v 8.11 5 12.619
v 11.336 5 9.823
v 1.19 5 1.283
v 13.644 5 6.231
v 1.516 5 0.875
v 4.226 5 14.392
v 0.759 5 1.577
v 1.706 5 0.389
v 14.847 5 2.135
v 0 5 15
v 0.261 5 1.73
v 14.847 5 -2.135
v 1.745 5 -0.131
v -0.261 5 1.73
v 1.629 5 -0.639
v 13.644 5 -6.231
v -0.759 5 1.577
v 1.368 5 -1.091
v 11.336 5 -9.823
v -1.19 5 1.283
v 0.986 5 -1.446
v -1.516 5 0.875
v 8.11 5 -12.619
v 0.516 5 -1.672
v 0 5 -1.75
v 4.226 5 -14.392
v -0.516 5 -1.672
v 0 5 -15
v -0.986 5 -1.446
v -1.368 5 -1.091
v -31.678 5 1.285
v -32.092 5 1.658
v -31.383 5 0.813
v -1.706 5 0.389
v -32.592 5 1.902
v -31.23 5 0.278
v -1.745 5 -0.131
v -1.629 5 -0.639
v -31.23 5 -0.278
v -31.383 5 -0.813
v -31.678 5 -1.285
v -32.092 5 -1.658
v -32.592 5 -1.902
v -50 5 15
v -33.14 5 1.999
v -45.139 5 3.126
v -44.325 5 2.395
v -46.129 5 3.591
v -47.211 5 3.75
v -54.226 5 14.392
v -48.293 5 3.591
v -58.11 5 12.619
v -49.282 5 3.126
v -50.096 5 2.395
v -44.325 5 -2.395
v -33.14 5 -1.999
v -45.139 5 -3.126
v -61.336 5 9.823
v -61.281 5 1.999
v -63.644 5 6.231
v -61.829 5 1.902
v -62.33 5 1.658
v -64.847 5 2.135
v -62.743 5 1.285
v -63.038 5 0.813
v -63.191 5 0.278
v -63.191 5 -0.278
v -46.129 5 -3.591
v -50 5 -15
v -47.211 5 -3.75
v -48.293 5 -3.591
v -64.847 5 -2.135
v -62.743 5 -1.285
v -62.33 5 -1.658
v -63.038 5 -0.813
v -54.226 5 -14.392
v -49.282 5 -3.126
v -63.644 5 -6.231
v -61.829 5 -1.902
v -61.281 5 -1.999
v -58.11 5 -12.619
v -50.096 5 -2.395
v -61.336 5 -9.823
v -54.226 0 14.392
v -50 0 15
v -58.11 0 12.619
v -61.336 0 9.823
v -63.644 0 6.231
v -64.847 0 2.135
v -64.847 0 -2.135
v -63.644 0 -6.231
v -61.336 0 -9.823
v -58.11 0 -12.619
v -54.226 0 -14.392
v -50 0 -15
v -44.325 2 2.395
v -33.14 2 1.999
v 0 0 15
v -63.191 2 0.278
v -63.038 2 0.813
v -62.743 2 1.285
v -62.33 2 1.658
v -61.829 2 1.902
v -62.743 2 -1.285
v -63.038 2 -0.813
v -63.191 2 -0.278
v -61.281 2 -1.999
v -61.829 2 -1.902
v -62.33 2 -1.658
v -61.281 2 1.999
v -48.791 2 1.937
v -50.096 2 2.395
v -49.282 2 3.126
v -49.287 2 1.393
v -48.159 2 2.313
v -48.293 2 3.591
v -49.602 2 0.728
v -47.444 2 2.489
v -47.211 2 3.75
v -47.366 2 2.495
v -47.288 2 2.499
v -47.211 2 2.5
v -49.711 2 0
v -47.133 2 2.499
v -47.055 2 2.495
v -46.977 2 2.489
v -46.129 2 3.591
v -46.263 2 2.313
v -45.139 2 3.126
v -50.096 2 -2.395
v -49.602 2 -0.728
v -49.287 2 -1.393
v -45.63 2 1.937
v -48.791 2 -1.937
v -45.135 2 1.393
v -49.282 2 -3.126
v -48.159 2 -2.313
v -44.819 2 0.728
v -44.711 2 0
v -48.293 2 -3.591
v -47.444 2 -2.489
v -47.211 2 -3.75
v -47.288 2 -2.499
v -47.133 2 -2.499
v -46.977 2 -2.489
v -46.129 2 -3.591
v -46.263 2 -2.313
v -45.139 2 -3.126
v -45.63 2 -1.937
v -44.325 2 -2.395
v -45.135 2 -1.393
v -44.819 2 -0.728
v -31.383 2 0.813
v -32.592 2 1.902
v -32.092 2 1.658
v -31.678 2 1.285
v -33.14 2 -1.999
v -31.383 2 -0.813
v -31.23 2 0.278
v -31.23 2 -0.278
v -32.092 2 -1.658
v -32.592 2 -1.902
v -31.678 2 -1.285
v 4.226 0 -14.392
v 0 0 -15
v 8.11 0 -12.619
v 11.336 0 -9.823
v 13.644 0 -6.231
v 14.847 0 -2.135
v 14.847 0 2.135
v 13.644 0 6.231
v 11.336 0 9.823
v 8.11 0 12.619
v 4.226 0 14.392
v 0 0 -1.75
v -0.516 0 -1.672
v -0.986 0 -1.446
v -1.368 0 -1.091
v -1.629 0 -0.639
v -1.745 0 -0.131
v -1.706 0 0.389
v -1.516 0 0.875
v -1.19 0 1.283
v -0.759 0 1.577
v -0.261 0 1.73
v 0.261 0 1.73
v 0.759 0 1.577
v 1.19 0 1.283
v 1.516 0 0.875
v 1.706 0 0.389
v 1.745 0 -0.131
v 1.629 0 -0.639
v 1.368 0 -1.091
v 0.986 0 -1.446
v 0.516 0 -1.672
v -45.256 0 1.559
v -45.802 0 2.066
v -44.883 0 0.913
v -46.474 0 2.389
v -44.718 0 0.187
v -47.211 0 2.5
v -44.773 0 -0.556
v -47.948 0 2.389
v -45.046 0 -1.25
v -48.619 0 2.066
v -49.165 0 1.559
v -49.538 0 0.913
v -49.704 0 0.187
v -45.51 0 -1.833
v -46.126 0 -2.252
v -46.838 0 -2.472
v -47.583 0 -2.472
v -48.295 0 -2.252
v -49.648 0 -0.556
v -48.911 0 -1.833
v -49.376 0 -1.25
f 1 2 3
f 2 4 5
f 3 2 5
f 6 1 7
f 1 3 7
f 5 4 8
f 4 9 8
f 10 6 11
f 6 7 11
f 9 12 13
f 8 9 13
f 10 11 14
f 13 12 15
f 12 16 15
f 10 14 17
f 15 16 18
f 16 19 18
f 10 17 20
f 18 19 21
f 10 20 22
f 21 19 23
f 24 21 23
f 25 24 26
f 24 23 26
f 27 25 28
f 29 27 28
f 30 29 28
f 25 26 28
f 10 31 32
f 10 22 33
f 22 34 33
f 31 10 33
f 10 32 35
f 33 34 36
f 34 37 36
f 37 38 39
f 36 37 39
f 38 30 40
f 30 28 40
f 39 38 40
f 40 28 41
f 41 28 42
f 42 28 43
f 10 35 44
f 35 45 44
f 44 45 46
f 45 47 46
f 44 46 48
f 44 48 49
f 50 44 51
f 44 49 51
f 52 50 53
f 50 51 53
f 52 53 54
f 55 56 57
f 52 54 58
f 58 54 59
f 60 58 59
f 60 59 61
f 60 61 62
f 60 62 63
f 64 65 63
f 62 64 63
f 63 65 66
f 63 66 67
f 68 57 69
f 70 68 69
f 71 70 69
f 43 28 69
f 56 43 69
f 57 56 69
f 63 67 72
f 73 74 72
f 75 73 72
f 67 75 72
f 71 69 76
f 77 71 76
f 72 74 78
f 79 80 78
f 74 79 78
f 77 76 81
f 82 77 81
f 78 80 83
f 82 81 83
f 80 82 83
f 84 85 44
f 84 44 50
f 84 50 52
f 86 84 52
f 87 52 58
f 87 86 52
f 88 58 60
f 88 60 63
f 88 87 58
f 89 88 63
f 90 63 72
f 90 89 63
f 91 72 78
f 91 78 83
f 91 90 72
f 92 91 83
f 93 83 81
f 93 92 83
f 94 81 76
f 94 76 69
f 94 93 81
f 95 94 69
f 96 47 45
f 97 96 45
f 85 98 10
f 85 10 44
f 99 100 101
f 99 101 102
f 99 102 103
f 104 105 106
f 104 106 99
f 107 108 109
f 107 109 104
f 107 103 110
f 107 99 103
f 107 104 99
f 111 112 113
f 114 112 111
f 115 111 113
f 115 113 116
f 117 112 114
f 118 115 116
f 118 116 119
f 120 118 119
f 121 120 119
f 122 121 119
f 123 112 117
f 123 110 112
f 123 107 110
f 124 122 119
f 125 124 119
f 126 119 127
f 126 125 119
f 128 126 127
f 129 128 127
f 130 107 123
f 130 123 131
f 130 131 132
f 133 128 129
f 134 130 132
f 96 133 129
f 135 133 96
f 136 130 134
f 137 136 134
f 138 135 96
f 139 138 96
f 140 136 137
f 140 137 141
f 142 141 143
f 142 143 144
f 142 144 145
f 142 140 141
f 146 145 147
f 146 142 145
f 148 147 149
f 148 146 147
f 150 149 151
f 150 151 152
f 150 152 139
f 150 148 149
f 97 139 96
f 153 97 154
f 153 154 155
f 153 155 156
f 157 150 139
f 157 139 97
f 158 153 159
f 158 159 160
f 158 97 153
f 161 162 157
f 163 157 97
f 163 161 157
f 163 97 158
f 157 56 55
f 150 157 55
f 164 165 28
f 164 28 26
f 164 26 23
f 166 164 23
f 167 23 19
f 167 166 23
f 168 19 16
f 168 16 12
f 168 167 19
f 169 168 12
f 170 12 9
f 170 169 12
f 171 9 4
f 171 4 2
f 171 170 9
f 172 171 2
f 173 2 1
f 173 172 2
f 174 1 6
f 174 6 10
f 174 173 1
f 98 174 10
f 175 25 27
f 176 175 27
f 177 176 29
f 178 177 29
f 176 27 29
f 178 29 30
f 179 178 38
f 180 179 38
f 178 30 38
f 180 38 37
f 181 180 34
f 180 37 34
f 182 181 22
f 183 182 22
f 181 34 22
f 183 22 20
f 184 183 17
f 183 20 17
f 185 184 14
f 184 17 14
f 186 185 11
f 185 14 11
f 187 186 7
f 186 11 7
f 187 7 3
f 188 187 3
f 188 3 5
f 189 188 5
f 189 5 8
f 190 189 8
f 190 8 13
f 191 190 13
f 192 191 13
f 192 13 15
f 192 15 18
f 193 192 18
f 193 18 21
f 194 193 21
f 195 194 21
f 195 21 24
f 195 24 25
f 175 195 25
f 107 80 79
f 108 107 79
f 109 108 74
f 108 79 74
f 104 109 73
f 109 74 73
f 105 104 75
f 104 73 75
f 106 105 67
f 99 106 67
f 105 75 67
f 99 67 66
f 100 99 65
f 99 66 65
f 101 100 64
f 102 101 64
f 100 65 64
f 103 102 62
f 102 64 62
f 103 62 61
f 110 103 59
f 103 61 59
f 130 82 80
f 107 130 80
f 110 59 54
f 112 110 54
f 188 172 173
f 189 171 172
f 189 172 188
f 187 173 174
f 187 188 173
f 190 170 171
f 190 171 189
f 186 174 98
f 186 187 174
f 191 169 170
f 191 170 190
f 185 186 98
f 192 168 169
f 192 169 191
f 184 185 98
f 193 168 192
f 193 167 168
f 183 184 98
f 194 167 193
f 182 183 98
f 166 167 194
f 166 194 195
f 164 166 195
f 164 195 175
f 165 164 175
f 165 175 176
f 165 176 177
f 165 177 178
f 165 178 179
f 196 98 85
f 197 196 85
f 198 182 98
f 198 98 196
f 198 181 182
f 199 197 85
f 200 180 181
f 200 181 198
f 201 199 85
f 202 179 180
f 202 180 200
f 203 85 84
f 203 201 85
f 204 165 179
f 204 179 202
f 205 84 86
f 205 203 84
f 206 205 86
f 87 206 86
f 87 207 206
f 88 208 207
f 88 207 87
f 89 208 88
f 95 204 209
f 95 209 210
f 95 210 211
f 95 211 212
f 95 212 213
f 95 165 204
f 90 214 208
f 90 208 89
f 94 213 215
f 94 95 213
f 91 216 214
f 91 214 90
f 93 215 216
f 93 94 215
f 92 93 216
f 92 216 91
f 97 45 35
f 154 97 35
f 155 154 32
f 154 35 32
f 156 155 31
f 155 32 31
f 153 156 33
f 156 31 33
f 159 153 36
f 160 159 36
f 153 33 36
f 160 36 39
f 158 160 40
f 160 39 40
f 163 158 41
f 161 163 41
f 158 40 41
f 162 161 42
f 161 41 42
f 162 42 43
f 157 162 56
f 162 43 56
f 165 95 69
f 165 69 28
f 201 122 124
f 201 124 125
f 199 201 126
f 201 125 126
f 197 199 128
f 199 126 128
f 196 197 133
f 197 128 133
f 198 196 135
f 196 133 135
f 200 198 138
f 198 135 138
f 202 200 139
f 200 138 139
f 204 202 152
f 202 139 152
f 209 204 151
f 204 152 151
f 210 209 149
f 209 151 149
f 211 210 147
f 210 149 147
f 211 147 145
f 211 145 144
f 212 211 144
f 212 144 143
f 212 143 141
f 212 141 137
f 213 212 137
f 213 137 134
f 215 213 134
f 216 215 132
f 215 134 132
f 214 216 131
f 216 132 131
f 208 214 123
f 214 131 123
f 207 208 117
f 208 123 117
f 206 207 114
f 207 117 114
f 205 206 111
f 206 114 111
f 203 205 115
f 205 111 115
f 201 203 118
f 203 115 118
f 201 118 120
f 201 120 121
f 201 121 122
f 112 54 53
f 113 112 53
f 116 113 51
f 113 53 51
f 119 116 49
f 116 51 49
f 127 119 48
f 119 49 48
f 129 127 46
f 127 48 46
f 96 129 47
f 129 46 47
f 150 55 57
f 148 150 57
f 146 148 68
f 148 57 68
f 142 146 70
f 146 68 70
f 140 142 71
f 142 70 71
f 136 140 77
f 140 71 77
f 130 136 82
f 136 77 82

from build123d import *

# Parameters (mm, degrees)
RESSALTO_EXTRUS_O2_DEPTH = 5
ESBO_O4_R                = 1.75
CORTE_EXTRUS_O1_DEPTH    = 10
CORTE_EXTRUS_O2_DEPTH    = 3
ESBO_O7_R                = 2.5
CORTE_EXTRUS_O3_DEPTH    = 67.895440801


with BuildPart() as part:
    # Esboço3 → Ressalto-extrusão2 (new body)
    with BuildSketch(Plane(origin=(0, 0, 0), x_dir=(1, 0, 0), z_dir=(0, 1, 0))):
        with BuildLine():
            Line((-50, 15), (0, 15))
            ThreePointArc((0, 15), (15, 0), (0, -15))
            Line((0, -15), (-50, -15))
            ThreePointArc((-50, -15), (-65, 0), (-50, 15))
        make_face()
    extrude(amount=RESSALTO_EXTRUS_O2_DEPTH)

    # Esboço4 → Corte-extrusão1 (cut)
    with BuildSketch(Plane(origin=(0, 5, 0), x_dir=(1, 0, 0), z_dir=(0, 1, 0))):
        with Locations(Location((0, 0, 0), (0, 0, 90))):
            Circle(ESBO_O4_R)
    extrude(amount=-CORTE_EXTRUS_O1_DEPTH, mode=Mode.SUBTRACT)

    # Esboço6 → Corte-extrusão2 (cut)
    with BuildSketch(Plane(origin=(0, 5, 0), x_dir=(1, 0, 0), z_dir=(0, 1, 0))):
        with BuildLine():
            Line((-50.096108497, 2.395111434), (-61.281465627, 1.998745461))
            ThreePointArc((-61.281465627, 1.998745461), (-63.210637787, 0), (-61.281465627, -1.998745461))
            Line((-61.281465627, -1.998745461), (-50.096108497, -2.395111434))
            ThreePointArc((-50.096108497, -2.395111434), (-47.210637787, -3.75), (-44.325167077, -2.395111434))
            Line((-44.325167077, -2.395111434), (-33.139809947, -1.998745461))
            ThreePointArc((-33.139809947, -1.998745461), (-31.210637787, 0), (-33.139809947, 1.998745461))
            Line((-33.139809947, 1.998745461), (-44.325167077, 2.395111434))
            ThreePointArc((-44.325167077, 2.395111434), (-47.210637787, 3.75), (-50.096108497, 2.395111434))
        make_face()
        with BuildLine():
            ThreePointArc((-47.443873787, 2.489096416), (-47.210637787, 2.5), (-46.977401787, 2.489096416))
            ThreePointArc((-46.977401787, 2.489096416), (-45.362247947, 1.683286963), (-44.710637787, 0))
            ThreePointArc((-44.710637787, 0), (-45.362247947, -1.683286963), (-46.977401787, -2.489096416))
            ThreePointArc((-46.977401787, -2.489096416), (-47.210637787, -2.5), (-47.443873787, -2.489096416))
            ThreePointArc((-47.443873787, -2.489096416), (-49.710637787, 0), (-47.443873787, 2.489096416))
        make_face(mode=Mode.SUBTRACT)
    extrude(amount=-CORTE_EXTRUS_O2_DEPTH, mode=Mode.SUBTRACT)

    # Esboço7 → Corte-extrusão3 (cut, through all)
    with BuildSketch(Plane(origin=(0, 5, 0), x_dir=(1, 0, 0), z_dir=(0, 1, 0))):
        with Locations(Location((-47.210637787, 0, 0), (0, 0, 270))):
            Circle(ESBO_O7_R)
    extrude(amount=-CORTE_EXTRUS_O3_DEPTH, mode=Mode.SUBTRACT)


solid = part.part
